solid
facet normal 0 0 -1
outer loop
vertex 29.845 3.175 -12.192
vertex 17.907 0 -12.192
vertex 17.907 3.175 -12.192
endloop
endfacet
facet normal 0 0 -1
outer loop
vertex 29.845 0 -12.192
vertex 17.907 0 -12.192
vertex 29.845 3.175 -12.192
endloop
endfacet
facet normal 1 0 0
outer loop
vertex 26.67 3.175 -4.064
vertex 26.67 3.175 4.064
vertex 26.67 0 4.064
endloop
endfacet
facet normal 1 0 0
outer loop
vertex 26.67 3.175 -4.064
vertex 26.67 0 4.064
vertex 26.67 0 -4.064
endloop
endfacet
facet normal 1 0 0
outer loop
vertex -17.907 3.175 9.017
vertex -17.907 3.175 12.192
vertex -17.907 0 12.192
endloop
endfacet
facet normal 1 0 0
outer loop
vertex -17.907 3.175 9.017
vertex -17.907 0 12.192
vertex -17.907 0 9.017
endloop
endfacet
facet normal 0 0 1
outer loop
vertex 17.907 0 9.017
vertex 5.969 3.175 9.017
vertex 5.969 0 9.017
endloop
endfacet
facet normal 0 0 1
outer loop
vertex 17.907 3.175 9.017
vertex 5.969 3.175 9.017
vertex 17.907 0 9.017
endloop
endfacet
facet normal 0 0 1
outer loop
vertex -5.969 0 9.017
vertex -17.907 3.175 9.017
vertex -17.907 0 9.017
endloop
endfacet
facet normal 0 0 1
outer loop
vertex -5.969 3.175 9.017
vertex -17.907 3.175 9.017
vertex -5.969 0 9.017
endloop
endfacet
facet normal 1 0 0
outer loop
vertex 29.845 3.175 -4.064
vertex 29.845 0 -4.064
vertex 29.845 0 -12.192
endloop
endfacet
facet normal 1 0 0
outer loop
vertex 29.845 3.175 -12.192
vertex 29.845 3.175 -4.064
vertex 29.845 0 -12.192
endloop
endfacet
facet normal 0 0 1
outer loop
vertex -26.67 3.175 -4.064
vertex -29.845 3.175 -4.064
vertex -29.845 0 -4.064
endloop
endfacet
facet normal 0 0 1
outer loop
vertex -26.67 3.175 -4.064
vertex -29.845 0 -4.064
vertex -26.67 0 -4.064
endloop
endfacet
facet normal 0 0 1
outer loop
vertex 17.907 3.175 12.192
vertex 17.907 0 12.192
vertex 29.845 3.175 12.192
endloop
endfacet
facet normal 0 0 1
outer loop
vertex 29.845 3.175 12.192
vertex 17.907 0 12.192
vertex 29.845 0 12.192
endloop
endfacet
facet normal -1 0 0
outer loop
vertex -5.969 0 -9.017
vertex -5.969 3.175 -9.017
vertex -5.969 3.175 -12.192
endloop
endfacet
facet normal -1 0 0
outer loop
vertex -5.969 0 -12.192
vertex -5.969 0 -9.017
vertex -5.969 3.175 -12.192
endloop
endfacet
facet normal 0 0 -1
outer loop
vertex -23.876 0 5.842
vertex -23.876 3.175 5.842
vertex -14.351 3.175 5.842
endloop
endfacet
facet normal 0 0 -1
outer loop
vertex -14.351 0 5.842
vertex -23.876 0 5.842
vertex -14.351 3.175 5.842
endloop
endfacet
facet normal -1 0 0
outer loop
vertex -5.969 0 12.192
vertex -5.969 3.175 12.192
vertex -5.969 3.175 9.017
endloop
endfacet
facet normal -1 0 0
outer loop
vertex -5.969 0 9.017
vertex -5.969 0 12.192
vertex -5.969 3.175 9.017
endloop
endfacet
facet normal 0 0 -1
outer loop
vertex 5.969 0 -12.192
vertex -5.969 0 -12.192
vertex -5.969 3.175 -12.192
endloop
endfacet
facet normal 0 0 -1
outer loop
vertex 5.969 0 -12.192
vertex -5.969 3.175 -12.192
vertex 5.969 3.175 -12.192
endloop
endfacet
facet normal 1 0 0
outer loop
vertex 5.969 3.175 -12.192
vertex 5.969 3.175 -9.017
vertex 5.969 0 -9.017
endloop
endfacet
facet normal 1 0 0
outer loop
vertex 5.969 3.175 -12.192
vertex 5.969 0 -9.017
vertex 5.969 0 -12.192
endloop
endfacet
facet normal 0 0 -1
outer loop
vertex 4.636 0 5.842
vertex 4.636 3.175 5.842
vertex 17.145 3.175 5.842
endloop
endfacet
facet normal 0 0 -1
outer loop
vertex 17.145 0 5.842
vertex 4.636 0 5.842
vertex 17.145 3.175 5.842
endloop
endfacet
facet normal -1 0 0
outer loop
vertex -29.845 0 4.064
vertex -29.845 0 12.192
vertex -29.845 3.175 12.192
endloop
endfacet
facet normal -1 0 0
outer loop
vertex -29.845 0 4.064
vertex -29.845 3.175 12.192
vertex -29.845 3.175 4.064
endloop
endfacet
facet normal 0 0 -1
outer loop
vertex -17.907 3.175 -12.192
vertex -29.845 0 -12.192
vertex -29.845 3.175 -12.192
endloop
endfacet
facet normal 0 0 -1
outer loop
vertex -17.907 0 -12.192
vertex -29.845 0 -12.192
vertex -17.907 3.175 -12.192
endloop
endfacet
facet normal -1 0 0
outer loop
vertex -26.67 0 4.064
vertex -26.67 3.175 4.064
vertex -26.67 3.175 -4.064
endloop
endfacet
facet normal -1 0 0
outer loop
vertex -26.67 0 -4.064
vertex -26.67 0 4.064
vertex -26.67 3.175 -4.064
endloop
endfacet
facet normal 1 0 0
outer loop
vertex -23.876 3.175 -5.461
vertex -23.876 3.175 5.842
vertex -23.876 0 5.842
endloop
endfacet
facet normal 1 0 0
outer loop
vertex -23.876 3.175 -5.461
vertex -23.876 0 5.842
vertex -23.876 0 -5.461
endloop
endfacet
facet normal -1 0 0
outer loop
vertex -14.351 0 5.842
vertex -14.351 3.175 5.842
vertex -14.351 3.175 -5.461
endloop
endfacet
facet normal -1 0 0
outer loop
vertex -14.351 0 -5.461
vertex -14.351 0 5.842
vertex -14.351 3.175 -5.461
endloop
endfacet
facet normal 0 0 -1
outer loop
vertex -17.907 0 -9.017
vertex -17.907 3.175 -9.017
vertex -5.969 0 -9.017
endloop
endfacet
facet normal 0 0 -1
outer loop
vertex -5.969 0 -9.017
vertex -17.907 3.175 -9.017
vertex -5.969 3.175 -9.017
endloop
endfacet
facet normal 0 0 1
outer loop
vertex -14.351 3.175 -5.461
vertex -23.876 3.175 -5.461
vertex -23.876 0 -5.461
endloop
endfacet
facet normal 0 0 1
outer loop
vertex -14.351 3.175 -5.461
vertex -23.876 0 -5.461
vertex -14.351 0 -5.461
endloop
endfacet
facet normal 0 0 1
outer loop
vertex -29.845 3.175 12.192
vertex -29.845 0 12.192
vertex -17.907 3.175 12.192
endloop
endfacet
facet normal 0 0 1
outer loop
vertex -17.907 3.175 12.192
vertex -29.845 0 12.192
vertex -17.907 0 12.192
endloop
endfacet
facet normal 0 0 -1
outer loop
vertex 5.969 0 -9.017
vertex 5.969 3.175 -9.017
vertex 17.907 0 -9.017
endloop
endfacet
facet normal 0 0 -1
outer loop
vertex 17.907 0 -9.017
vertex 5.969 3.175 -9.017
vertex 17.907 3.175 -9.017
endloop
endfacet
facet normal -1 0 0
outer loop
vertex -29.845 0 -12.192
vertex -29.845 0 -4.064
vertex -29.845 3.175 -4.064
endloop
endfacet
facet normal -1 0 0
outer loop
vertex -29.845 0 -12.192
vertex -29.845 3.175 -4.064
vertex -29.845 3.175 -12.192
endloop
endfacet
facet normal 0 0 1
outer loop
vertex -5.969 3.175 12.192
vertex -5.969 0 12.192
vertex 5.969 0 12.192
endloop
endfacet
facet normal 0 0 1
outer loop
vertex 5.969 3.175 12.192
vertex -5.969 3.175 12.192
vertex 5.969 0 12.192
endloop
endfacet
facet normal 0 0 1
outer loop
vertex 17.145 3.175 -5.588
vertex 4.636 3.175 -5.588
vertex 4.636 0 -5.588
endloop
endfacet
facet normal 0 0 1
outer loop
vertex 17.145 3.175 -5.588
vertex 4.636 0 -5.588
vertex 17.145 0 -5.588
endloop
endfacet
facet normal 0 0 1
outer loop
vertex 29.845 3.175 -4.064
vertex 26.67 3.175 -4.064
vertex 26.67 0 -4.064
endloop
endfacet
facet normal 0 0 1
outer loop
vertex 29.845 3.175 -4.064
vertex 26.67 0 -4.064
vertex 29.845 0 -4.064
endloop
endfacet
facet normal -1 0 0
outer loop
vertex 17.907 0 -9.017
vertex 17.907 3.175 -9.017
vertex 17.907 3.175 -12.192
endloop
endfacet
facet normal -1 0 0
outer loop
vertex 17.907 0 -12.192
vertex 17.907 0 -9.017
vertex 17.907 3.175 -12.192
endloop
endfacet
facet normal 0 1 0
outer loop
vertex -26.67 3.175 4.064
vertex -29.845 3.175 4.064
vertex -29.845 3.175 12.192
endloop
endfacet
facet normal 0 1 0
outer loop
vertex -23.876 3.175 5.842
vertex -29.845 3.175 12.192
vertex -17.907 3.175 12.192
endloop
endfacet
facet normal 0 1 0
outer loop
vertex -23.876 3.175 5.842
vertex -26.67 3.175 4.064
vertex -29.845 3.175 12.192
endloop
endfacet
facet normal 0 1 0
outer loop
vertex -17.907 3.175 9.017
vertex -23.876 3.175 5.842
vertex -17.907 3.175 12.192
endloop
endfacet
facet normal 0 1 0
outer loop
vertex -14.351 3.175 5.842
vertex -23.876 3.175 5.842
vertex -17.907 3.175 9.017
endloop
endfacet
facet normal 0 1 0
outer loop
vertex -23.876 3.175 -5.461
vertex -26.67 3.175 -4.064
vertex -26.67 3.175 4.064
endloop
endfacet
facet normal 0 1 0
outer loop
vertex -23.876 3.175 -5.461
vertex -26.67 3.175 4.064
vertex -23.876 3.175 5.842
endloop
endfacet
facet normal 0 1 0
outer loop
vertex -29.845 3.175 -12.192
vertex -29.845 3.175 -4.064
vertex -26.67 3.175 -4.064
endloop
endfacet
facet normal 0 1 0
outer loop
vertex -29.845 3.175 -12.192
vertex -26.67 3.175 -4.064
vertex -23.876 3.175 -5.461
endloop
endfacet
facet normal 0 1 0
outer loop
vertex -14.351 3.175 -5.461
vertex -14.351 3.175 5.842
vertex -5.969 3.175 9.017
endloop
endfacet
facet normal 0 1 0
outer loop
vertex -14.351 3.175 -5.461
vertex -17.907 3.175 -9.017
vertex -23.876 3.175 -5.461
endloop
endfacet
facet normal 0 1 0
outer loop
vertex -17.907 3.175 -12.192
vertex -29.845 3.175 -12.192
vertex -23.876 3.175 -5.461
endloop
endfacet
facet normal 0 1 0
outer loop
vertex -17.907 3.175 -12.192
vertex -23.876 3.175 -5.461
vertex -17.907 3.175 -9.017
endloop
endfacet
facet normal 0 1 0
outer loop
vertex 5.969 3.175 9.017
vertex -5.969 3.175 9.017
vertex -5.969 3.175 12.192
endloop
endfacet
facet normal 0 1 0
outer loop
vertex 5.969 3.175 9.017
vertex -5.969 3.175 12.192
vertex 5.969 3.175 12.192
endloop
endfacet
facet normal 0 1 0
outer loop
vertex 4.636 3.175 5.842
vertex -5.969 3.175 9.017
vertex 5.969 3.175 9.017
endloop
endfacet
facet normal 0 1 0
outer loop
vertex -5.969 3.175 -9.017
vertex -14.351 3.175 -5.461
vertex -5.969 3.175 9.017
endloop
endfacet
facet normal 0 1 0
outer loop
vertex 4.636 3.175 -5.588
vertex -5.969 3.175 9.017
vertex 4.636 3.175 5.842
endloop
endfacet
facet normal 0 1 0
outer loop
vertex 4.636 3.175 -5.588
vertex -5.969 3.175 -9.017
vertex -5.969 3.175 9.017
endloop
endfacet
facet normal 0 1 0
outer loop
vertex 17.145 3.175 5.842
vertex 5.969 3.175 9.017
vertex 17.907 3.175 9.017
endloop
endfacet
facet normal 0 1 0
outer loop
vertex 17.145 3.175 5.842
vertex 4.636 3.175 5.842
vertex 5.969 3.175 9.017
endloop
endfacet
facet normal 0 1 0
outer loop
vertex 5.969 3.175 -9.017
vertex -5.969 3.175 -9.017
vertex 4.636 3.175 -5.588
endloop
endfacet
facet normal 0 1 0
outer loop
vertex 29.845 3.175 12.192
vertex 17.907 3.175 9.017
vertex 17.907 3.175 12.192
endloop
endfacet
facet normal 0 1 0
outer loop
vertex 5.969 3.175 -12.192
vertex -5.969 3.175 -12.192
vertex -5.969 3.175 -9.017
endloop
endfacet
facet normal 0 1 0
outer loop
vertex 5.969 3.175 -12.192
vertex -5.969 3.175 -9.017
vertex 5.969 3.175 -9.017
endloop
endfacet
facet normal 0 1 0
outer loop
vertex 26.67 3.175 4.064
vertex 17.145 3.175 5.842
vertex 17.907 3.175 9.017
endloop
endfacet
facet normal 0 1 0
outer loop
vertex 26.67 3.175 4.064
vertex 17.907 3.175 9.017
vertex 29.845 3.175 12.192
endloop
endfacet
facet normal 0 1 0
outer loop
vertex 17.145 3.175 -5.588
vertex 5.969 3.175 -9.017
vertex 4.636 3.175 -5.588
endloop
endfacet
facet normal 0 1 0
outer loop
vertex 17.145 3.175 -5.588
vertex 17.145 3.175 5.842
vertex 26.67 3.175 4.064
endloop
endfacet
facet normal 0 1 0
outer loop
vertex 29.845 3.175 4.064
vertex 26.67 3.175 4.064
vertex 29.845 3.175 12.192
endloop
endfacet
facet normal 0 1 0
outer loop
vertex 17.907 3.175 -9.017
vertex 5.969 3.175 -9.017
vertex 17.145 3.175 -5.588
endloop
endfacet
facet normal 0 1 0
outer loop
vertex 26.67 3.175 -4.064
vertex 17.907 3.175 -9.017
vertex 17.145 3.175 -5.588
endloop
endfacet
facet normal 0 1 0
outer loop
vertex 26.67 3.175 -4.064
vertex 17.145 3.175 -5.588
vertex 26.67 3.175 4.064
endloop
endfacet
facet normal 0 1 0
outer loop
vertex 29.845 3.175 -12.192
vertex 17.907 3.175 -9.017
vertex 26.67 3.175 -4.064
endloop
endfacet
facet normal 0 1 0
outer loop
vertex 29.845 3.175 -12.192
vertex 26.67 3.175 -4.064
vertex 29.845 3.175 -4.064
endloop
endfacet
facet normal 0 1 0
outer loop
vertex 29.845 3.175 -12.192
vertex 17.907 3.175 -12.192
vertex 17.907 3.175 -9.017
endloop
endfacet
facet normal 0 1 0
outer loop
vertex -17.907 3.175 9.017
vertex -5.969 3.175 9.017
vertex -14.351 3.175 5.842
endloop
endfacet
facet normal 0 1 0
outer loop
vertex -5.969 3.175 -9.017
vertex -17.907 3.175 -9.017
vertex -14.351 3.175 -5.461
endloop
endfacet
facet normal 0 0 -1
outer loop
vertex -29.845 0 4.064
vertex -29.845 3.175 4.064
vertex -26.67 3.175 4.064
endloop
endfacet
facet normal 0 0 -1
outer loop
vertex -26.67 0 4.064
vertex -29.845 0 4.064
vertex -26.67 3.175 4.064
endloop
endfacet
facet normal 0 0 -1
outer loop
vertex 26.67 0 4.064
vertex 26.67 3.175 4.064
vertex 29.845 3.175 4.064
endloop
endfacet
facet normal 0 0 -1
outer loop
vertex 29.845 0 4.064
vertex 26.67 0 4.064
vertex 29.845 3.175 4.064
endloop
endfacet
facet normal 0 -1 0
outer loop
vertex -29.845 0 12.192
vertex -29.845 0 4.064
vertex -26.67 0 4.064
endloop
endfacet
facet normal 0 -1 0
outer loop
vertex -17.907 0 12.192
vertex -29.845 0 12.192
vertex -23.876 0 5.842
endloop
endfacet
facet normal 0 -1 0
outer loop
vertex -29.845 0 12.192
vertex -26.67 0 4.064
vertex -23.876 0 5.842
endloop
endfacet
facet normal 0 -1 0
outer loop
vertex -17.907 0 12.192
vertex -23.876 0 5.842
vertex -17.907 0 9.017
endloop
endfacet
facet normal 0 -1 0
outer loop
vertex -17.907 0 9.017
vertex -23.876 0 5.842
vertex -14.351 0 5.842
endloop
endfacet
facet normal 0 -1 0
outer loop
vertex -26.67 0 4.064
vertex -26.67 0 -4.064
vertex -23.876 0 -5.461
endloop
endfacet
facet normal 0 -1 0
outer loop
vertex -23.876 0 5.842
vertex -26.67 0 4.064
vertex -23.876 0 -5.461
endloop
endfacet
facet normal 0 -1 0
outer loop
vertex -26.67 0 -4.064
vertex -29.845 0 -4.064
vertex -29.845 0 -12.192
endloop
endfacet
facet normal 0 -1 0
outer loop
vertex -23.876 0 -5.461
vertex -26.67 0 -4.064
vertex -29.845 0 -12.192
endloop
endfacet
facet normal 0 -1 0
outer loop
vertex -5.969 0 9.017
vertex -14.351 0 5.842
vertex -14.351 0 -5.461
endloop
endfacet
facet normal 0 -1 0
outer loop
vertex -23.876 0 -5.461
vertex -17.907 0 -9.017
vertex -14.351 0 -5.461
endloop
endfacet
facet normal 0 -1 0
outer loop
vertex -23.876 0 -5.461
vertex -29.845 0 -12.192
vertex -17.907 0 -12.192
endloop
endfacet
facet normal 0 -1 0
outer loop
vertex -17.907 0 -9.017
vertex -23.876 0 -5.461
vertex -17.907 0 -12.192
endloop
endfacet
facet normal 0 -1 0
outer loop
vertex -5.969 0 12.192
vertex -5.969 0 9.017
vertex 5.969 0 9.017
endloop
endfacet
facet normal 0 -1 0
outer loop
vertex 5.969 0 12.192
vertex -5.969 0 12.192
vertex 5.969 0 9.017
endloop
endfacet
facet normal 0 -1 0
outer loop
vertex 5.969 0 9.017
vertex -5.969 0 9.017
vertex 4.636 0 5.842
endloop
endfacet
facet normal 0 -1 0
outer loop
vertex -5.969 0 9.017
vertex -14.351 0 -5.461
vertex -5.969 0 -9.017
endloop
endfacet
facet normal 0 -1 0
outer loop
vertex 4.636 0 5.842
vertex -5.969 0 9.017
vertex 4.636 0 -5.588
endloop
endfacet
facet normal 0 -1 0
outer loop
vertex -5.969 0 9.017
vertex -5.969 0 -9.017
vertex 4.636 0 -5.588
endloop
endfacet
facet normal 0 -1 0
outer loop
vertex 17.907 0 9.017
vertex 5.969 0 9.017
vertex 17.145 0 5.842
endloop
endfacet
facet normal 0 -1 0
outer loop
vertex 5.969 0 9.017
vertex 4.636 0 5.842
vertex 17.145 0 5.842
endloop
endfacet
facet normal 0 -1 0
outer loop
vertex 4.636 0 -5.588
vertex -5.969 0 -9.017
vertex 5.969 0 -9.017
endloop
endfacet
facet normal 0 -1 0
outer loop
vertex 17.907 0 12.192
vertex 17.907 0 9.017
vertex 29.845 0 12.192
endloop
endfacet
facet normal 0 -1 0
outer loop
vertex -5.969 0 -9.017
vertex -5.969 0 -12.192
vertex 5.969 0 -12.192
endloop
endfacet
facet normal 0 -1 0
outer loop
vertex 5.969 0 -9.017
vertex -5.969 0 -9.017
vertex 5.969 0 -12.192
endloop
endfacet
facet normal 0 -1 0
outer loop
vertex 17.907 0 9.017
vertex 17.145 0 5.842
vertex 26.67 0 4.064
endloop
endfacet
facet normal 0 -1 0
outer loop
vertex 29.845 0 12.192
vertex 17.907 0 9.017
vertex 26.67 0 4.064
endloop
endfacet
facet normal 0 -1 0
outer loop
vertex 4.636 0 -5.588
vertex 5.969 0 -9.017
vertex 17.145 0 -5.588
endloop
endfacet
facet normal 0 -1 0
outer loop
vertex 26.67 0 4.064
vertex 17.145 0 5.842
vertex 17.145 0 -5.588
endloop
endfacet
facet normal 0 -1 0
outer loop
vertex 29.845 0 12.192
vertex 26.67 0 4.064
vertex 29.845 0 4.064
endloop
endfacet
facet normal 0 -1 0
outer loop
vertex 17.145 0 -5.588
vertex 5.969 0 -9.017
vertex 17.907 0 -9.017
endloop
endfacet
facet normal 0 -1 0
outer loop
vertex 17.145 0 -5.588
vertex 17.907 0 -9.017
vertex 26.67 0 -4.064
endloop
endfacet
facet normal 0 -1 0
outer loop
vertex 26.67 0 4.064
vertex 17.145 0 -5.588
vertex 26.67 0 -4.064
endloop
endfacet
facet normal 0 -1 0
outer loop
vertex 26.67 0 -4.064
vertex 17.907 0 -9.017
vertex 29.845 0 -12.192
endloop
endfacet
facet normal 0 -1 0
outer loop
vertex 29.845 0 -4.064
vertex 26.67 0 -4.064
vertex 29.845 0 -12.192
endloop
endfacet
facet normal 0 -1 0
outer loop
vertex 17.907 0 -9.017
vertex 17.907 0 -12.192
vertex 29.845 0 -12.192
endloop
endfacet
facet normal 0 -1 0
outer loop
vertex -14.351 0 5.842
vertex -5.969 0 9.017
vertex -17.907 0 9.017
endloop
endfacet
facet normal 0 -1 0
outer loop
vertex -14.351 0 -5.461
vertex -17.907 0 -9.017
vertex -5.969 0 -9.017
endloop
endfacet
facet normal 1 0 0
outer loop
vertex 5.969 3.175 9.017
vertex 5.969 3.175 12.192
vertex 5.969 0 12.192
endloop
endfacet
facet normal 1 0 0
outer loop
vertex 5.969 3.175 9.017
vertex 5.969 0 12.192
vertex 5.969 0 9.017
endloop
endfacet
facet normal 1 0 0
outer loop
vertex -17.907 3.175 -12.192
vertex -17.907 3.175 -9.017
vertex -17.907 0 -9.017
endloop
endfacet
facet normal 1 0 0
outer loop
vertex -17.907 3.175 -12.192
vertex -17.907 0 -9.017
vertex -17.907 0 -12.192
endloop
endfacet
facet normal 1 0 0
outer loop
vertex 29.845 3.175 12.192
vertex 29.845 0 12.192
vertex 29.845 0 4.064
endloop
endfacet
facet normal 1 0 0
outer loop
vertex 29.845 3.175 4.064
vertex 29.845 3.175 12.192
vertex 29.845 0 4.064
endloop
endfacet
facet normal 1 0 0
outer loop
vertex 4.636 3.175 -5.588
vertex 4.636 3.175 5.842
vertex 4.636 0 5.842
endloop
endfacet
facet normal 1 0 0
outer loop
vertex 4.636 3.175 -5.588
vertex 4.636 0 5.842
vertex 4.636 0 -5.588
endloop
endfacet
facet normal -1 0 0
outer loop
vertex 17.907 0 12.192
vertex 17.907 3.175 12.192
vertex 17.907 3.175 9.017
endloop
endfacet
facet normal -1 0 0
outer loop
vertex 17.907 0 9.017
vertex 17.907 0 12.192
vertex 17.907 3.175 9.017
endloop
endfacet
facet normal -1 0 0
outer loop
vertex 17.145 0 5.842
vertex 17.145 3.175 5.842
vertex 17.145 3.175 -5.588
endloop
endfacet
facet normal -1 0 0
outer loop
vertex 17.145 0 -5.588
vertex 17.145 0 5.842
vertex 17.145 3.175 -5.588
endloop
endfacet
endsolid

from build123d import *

# Parameters (mm, degrees)
SKETCH1_W           = 59.69
SKETCH1_H           = 24.384
BOSS_EXTRUDE2_DEPTH = 3.175
SKETCH3_W           = 11.938
SKETCH3_H           = 3.175
CUT_EXTRUDE2_DEPTH  = 3.175
LPATTERN2_COUNT     = 2
LPATTERN2_PITCH     = 23.876
SKETCH4_W           = 6.35
SKETCH4_H           = 8.128
CUT_EXTRUDE3_DEPTH  = 3.175
SKETCH5_W           = 9.525
SKETCH5_H           = 11.303
SKETCH5_W_2         = 12.5095
SKETCH5_H_2         = 11.43
CUT_EXTRUDE4_DEPTH  = 3.175


with BuildPart() as part:
    # Sketch1 → Boss-Extrude2 (new body)
    with BuildSketch(Plane(origin=(0, 0, 0), x_dir=(1, 0, 0), z_dir=(0, 1, 0))):
        Rectangle(SKETCH1_W, SKETCH1_H)
    extrude(amount=BOSS_EXTRUDE2_DEPTH)

    # Sketch3 → Cut-Extrude2 (cut)
    with BuildSketch(Plane(origin=(0, 3.175, 0), x_dir=(1, 0, 0), z_dir=(0, 1, 0))):
        with Locations((11.938, 10.6045)):
            Rectangle(SKETCH3_W, SKETCH3_H)
        with Locations((11.938, -10.6045)):
            Rectangle(SKETCH3_W, SKETCH3_H)
    cut_extrude2 = extrude(amount=-CUT_EXTRUDE2_DEPTH, mode=Mode.SUBTRACT)

    # LPattern2: Cut-Extrude2 ×2
    with Locations(*[(-i * LPATTERN2_PITCH, 0, 0) for i in range(1, LPATTERN2_COUNT)]):
        add(cut_extrude2, mode=Mode.SUBTRACT)

    # Sketch4 → Cut-Extrude3 (cut)
    with BuildSketch(Plane(origin=(0, 3.175, 0), x_dir=(1, 0, 0), z_dir=(0, 1, 0))):
        with Locations((-29.845, 0)):
            Rectangle(SKETCH4_W, SKETCH4_H)
        with Locations((29.845, 0)):
            Rectangle(SKETCH4_W, SKETCH4_H)
    extrude(amount=-CUT_EXTRUDE3_DEPTH, mode=Mode.SUBTRACT)

    # Sketch5 → Cut-Extrude4 (cut)
    with BuildSketch(Plane(origin=(0, 3.175, 0), x_dir=(1, 0, 0), z_dir=(0, 1, 0))):
        with Locations((-19.1135, -0.1905)):
            Rectangle(SKETCH5_W, SKETCH5_H)
        with Locations((10.89025, -0.127)):
            Rectangle(SKETCH5_W_2, SKETCH5_H_2)
    extrude(amount=-CUT_EXTRUDE4_DEPTH, mode=Mode.SUBTRACT)


solid = part.part
